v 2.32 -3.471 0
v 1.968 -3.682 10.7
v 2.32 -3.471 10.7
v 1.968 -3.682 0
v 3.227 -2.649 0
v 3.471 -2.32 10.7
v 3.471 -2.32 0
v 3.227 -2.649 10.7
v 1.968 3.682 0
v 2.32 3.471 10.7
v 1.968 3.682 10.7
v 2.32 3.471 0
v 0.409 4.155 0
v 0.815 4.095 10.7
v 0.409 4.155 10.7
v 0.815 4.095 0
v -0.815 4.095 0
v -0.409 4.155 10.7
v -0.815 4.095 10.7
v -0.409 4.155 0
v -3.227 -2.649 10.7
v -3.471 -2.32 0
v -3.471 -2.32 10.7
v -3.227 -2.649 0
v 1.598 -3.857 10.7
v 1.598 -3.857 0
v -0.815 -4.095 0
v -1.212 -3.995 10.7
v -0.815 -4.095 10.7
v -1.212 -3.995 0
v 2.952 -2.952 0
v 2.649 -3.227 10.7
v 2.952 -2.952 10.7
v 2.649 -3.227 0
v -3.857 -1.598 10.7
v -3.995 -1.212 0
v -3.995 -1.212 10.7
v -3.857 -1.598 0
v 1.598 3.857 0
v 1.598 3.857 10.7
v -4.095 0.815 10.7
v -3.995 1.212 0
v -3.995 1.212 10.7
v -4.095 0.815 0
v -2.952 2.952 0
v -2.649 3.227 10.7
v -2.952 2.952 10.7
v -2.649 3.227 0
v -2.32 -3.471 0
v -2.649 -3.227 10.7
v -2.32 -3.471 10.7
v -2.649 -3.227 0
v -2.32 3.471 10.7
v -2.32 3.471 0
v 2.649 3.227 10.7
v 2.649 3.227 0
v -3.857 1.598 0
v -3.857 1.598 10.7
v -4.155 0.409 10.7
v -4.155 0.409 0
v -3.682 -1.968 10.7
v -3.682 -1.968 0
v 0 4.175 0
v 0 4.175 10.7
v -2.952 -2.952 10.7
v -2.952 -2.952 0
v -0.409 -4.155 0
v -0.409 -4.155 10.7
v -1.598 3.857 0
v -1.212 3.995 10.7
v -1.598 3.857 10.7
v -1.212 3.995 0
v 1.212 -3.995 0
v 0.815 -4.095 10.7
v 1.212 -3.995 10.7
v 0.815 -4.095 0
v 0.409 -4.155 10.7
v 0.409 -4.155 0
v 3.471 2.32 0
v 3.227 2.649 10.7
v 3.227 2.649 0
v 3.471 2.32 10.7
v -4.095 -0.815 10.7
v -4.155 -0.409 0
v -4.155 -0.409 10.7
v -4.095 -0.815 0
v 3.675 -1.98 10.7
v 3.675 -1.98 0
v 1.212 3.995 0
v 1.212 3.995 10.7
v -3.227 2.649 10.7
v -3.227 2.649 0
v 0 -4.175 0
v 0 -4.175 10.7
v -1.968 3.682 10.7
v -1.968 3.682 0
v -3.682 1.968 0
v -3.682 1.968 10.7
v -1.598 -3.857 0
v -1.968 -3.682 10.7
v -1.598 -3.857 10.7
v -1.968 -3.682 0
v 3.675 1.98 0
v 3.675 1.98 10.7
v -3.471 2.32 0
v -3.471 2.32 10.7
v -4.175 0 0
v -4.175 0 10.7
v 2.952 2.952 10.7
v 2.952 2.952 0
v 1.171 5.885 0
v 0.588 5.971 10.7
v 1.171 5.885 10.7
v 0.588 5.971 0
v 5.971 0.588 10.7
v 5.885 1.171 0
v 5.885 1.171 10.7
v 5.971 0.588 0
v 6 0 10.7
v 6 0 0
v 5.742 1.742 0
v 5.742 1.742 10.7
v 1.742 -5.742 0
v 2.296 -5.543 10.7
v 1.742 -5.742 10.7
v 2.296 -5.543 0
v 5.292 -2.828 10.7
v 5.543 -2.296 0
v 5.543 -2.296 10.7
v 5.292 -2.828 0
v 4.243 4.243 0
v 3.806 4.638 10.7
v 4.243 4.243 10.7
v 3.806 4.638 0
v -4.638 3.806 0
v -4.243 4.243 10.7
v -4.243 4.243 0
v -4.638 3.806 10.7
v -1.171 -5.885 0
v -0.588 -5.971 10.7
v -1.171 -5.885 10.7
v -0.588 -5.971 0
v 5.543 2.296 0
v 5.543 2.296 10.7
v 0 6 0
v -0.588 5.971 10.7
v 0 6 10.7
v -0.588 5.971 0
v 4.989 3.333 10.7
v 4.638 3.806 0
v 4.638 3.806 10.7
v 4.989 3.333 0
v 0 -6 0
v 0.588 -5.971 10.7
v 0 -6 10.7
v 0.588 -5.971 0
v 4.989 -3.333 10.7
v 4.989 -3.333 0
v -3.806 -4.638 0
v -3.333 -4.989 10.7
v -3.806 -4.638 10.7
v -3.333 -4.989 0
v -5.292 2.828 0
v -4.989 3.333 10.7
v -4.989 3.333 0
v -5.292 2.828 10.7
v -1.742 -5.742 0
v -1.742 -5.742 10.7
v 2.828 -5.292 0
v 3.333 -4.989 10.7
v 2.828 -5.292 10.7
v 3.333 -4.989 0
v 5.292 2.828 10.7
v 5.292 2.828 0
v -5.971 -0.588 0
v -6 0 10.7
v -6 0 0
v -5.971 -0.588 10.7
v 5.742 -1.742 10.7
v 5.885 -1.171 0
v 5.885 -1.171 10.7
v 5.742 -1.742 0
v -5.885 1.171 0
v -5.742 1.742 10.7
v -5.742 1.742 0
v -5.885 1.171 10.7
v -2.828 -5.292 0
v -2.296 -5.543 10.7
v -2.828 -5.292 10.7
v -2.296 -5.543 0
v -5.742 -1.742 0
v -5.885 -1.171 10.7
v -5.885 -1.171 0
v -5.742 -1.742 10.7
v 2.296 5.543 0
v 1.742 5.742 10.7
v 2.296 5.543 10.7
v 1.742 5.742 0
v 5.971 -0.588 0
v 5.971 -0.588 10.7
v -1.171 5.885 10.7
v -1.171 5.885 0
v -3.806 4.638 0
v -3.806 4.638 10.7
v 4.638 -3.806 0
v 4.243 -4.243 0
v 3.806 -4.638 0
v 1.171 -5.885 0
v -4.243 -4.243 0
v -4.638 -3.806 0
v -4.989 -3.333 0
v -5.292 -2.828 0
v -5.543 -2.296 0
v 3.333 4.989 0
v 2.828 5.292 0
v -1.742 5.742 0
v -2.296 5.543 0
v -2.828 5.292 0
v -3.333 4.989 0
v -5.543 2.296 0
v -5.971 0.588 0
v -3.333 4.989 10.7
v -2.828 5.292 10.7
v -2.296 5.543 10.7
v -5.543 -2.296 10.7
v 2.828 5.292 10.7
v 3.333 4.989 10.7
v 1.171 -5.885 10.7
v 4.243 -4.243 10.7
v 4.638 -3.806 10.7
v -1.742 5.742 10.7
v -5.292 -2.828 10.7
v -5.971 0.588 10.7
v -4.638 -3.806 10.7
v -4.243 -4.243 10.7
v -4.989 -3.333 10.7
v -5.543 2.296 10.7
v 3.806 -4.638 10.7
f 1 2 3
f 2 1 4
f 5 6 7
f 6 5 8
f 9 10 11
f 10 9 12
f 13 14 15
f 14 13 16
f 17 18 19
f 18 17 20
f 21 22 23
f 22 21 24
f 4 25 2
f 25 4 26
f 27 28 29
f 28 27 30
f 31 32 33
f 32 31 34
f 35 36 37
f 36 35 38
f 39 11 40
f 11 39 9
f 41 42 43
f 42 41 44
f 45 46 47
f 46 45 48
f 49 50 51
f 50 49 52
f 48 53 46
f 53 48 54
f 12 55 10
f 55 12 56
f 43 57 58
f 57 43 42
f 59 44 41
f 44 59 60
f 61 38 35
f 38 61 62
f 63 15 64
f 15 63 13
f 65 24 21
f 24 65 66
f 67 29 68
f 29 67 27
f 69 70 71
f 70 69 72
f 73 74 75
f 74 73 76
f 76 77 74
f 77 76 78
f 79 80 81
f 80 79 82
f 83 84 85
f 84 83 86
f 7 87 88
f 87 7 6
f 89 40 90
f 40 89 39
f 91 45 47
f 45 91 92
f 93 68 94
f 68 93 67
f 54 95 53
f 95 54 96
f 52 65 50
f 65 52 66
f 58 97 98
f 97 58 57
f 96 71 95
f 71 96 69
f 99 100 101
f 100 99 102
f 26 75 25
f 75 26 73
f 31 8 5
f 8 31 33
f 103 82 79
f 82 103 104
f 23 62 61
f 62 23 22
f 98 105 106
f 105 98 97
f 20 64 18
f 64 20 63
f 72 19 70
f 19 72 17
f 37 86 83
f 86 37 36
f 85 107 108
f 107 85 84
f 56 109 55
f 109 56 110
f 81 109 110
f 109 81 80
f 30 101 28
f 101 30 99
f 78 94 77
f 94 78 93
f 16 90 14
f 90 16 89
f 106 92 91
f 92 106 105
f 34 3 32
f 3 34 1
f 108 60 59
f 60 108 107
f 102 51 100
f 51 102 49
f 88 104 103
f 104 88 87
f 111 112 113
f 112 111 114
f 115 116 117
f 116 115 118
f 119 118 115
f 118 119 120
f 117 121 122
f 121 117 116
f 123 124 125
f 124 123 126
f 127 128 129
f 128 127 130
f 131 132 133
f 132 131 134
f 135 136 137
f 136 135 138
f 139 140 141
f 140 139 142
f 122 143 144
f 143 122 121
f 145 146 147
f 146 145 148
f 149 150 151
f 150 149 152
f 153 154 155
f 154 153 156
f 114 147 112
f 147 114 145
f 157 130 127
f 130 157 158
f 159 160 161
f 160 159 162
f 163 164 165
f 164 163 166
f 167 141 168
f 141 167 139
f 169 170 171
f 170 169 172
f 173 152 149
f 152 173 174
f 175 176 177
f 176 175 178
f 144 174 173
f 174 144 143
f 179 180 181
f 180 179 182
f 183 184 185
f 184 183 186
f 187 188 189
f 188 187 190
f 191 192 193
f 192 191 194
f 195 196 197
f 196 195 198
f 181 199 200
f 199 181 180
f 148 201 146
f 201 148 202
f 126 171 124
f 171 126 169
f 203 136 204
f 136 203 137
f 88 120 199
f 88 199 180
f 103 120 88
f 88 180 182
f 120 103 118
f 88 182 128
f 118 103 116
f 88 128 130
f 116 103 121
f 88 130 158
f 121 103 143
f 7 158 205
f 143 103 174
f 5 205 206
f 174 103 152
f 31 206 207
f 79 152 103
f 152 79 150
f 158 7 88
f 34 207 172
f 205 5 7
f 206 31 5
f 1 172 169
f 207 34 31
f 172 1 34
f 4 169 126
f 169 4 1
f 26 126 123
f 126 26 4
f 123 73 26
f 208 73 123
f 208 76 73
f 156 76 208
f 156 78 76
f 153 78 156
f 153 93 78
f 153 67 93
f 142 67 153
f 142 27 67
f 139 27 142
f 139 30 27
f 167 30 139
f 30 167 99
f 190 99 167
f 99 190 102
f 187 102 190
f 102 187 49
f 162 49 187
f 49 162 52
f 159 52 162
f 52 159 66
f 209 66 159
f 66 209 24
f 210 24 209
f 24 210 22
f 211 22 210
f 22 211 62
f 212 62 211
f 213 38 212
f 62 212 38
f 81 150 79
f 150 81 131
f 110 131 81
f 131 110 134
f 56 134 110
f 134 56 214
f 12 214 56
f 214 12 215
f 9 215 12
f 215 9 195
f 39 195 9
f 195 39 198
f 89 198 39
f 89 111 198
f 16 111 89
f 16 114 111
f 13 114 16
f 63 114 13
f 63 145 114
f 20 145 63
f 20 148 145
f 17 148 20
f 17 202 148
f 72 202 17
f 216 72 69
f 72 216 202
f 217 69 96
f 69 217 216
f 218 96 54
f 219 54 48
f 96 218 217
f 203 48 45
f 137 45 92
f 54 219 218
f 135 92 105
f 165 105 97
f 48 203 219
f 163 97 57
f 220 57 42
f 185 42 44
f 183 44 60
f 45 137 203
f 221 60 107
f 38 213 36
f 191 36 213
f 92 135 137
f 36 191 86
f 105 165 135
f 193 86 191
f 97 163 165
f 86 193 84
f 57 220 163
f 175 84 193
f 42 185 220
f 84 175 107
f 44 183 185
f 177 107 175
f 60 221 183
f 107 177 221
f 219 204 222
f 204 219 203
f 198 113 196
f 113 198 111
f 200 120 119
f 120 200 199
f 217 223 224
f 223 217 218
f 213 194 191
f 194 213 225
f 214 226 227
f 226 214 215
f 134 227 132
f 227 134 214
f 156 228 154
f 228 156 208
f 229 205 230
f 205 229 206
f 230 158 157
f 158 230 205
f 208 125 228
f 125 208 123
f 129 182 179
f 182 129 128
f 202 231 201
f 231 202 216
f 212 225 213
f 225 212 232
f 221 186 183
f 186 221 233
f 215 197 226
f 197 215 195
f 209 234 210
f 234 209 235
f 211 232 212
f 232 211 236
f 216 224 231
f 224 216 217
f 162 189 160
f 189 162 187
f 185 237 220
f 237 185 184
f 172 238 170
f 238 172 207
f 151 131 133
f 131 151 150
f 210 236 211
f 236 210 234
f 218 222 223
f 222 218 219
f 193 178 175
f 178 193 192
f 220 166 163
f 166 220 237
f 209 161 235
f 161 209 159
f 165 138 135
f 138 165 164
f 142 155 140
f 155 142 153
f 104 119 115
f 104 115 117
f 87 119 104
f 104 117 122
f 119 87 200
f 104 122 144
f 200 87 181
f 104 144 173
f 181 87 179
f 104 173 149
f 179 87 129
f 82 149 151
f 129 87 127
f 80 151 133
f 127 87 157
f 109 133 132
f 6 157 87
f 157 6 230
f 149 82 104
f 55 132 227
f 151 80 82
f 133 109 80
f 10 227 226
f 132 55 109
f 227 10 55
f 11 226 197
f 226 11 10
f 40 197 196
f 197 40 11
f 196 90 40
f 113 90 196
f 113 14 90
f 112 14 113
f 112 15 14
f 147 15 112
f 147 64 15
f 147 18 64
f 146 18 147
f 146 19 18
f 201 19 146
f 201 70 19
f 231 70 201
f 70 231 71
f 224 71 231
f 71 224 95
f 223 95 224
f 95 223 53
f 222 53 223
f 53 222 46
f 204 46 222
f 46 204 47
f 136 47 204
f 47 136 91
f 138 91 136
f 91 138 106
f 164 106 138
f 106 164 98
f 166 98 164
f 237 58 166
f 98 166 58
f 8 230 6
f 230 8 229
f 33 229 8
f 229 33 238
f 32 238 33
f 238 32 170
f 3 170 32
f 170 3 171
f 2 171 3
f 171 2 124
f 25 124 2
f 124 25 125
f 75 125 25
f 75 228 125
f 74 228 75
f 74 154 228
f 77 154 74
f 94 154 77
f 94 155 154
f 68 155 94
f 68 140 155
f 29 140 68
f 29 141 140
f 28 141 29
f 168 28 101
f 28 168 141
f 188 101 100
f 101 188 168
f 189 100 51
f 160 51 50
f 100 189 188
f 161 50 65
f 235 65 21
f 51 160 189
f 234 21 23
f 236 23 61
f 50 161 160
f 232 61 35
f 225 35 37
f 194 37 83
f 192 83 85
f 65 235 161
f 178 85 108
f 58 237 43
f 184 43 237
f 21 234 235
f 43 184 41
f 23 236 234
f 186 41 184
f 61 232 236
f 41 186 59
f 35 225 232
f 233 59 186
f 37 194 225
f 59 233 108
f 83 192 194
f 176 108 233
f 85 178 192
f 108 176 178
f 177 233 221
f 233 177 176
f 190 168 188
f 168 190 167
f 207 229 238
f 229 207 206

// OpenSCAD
// file: parameters.scad
// =============================================================================
// Gen-BR — nightly 2026-10-09 (physics_scorer, honest magpylib watts)
// Rotor-only swap for Gen-BO: the diametric Ø5 assists move from ±7 mm to ±6.2 mm around the R50 pole ring (R43.8/50/56.2), the closest spacing that still leaves a 0.9 mm printed web between Ø5.3 pockets (rule ≥0.8). Everything else — bobbins, 595 t windings, stator, Ø134 steel — is Gen-BO. Tonight's 138-row refine scan (ring radius 49–51, coil radii ±0.5, build ±0.4, copper height 7.9–8.3) found nothing better: the 8p/6c flush-seat family is saturated under the ~370 m wire budget, so this is a hair-width step (about +0.2 % over Gen-BO), not a breakthrough.
// Clocking 0 deg (magnets N facing S) + D-flat keyed bore + index notch + flip-symmetric hole map.
// Windable 2-piece bobbin; turns = physics_scorer turns_fit; copper only between flanges.
// Steel back-iron: 2× Ø134 × 4.76 mm (3/16") mild-steel discs (steel_backiron_disc.dxf); magnets sit ON the steel
// (through-pockets) -> score with --back-iron.
// =============================================================================
topology            = "dual_rotor";

// --- Wire / winding (physics_scorer winding-fit) -------------------------------
wire_awg            = 26;
wire_od             = 0.45;     // insulated OD mm (bare 0.405)
fill_realistic      = 0.65;     // insulated-wire area / window (DENSE layered wind with a jig; scorer cap 0.65)
turns               = 595;       // = physics_scorer turns_fit (do NOT raise)
coil_former_type    = "bobbin";
coil_core_inset     = 18.00;     // radial copper build: hub = copper boundary inset by this
wind_build_axial    = 0.0;      // nothing proud of the flanges
wind_build_radial   = 0.0;

// --- Bobbin (base + lid) ---------------------------------------------------------
coil_id_r           = 28.00;    // copper boundary sector
coil_od_r           = 70.00;
span_deg            = 53.24;    // = pitch - 2*asin((wall+0.85)/coil_id_r) -> >=1.2 mm stator web
former_web          = 8.10;     // copper height between flanges (TALL copper: steel keeps Bz up)
flange_t            = 0.80;     // >= 0.8 mm FDM wall rule (tall winds push on the flanges)
wall                = 0.80;     // flange lip beyond copper
former_bare_h       = former_web + 2 * flange_t;
coil_envelope_h     = former_bare_h + 2 * wind_build_axial;
tab_w               = 7.0;
tab_len             = 7.0;
tab_h               = former_bare_h / 2;
pin_d               = 1.9;      // 1.75 mm filament locating pin
coil_mount_r        = coil_od_r + 0.2 + 4.0;
lead_y              = 1.6;
lead_slot_w         = 0.9;
lead_groove_d       = 0.6;

// --- Gap -------------------------------------------------------------------------
run_clear           = 0.50;     // rotor face -> flange
gap_spacer_h        = run_clear + wind_build_axial;
m2m                 = coil_envelope_h + 2 * run_clear;   // rotor face to rotor face (= gap_sleeve length)

// --- Stator ----------------------------------------------------------------------
coil_stations       = 6;
bay_clear           = 0.25;
stator_thick        = former_bare_h;                        // bobbins flush both faces
stator_od           = 158;
shaft_clear_stator  = 14.0;     // stator is static; gap sleeve OD 12 spins inside

// --- Rotor(s) --------------------------------------------------------------------
magnet_Br           = 1.43;     // N52
magnet_d_large      = 20.0;
magnet_h_large      = 5.0;      // one O20x5 per pocket
magnet_h_small      = 5.0;      // one O5x5 per pocket
halbach_magnetisation = "diametric"; // O5x5 assist magnets MUST be DIAMETRICALLY magnetised (tangential)
rotor_b_same_axis   = true;     // same-index magnets share one axis: N faces S across the gap
large_pocket_d      = 20.3;
small_pocket_d      = 5.3;
pocket_h            = 5.00;     // THROUGH the carrier: magnet back face sits on the steel disc (FLUSH seat: carrier = magnet height, magnet face level with the rotor face)
large_n             = 8;
R_large             = 50.0;
R_small_inner       = 43.8;
R_small_mid         = 50.0;
R_small_outer       = 56.2;
small_r_list        = [R_small_inner, R_small_mid, R_small_outer];   // O5 pockets between poles
carrier_od          = 134.0;
carrier_thick       = pocket_h;
hub_h               = 12.0;     // > steel_t + insert: radial set-screw clears the steel
hub_od              = 24.0;     // slim hub so the M4 brace rods fit at R~18 inside the coil ring
hub_insert_d        = 4.0;      // M3 heat-set insert, radial, bears on the D-flat
rotor_b_offset_deg  = 0.0;      // CLOCKING: magnets directly opposite
shaft_key           = "dflat";
dflat_depth         = 0.5;      // 8 mm shaft with 0.5 mm flat (7.5 across flat)
index_notch_d       = 3.0;

// --- Steel back-iron (buyable laser-cut) -------------------------------------------
steel_t             = 4.76;      // mild steel thickness (image method ignores it; sized from steel_flux.py so the return path stays well below saturation)
steel_center_hole   = 26.0;     // slips over the rotor hub (OD 24)
steel_od            = carrier_od;   // steel disc OD = rotor carrier OD

// --- Modular MAX interface ----------------------------------------------------------
shaft_bore          = 8.35;
dflat_x             = 4.0 - dflat_depth + (shaft_bore - 8.0) / 2;
bearing_d           = 21.85;
bearing_h           = 7.2;
m3_clear            = 3.5;
bolt_r_inner        = 30.0;     // M3 steel-disc clamp bolts (inside the magnet ring)
bolt_n_inner        = 4;
bolt_inner_angles   = [0, 90, 180, 270];
bolt_r_outer        = 63.0;     // M3 steel-disc clamp bolts (outside the magnet ring)
bolt_outer_angles   = [45, 135, 225, 315];
flange_bolt_r       = 73.0;     // frame rods: OUTSIDE the rotor OD (rotors spin inside them)
flange_bolt_n       = 6;
flange_bolt_offset  = 30.00;    // between coil stations -> never cuts a lead groove/tab
brace_r             = 18.0;
brace_d             = 4.3;      // temporary M4 jack rods (assembly only)
brace_n             = 4;
brace_angles        = [45, 135, 225, 315];          // flip-symmetric

spacer_pad_od       = 14.0;
spacer_pad_id       = m3_clear;
endbell_od          = 158;
endbell_thick       = 8.0;
endbell_shaft_clear = 10.0;
collar_h            = 10.0;
standoff_od         = 9.0;
frame_standoff_h    = run_clear + carrier_thick + hub_h + collar_h + 2.0;
sleeve_od           = 12.0;
plate_max_mm        = 410;

$fn = 64;
// main file
// Gen-BR — gap sleeve: rigid spacer on the shaft BETWEEN the two rotor carriers (passes through the stator
// hole). Length = m2m, so it sets the magnet gap and carries the full magnet pull. Print x1, upright.
include <parameters.scad>;
$fn = 64;
// D-flat keyed bore: flat faces +X (angle 0 = magnet pocket 0 = index notch)
module dflat_bore(h) {
    intersection() {
        cylinder(d=shaft_bore, h=h);
        translate([-shaft_bore, -shaft_bore, 0]) cube([shaft_bore + dflat_x, 2*shaft_bore, h]);
    }
}

difference() {
    cylinder(d=sleeve_od, h=m2m);
    translate([0, 0, -0.1]) dflat_bore(m2m + 0.2);
}
